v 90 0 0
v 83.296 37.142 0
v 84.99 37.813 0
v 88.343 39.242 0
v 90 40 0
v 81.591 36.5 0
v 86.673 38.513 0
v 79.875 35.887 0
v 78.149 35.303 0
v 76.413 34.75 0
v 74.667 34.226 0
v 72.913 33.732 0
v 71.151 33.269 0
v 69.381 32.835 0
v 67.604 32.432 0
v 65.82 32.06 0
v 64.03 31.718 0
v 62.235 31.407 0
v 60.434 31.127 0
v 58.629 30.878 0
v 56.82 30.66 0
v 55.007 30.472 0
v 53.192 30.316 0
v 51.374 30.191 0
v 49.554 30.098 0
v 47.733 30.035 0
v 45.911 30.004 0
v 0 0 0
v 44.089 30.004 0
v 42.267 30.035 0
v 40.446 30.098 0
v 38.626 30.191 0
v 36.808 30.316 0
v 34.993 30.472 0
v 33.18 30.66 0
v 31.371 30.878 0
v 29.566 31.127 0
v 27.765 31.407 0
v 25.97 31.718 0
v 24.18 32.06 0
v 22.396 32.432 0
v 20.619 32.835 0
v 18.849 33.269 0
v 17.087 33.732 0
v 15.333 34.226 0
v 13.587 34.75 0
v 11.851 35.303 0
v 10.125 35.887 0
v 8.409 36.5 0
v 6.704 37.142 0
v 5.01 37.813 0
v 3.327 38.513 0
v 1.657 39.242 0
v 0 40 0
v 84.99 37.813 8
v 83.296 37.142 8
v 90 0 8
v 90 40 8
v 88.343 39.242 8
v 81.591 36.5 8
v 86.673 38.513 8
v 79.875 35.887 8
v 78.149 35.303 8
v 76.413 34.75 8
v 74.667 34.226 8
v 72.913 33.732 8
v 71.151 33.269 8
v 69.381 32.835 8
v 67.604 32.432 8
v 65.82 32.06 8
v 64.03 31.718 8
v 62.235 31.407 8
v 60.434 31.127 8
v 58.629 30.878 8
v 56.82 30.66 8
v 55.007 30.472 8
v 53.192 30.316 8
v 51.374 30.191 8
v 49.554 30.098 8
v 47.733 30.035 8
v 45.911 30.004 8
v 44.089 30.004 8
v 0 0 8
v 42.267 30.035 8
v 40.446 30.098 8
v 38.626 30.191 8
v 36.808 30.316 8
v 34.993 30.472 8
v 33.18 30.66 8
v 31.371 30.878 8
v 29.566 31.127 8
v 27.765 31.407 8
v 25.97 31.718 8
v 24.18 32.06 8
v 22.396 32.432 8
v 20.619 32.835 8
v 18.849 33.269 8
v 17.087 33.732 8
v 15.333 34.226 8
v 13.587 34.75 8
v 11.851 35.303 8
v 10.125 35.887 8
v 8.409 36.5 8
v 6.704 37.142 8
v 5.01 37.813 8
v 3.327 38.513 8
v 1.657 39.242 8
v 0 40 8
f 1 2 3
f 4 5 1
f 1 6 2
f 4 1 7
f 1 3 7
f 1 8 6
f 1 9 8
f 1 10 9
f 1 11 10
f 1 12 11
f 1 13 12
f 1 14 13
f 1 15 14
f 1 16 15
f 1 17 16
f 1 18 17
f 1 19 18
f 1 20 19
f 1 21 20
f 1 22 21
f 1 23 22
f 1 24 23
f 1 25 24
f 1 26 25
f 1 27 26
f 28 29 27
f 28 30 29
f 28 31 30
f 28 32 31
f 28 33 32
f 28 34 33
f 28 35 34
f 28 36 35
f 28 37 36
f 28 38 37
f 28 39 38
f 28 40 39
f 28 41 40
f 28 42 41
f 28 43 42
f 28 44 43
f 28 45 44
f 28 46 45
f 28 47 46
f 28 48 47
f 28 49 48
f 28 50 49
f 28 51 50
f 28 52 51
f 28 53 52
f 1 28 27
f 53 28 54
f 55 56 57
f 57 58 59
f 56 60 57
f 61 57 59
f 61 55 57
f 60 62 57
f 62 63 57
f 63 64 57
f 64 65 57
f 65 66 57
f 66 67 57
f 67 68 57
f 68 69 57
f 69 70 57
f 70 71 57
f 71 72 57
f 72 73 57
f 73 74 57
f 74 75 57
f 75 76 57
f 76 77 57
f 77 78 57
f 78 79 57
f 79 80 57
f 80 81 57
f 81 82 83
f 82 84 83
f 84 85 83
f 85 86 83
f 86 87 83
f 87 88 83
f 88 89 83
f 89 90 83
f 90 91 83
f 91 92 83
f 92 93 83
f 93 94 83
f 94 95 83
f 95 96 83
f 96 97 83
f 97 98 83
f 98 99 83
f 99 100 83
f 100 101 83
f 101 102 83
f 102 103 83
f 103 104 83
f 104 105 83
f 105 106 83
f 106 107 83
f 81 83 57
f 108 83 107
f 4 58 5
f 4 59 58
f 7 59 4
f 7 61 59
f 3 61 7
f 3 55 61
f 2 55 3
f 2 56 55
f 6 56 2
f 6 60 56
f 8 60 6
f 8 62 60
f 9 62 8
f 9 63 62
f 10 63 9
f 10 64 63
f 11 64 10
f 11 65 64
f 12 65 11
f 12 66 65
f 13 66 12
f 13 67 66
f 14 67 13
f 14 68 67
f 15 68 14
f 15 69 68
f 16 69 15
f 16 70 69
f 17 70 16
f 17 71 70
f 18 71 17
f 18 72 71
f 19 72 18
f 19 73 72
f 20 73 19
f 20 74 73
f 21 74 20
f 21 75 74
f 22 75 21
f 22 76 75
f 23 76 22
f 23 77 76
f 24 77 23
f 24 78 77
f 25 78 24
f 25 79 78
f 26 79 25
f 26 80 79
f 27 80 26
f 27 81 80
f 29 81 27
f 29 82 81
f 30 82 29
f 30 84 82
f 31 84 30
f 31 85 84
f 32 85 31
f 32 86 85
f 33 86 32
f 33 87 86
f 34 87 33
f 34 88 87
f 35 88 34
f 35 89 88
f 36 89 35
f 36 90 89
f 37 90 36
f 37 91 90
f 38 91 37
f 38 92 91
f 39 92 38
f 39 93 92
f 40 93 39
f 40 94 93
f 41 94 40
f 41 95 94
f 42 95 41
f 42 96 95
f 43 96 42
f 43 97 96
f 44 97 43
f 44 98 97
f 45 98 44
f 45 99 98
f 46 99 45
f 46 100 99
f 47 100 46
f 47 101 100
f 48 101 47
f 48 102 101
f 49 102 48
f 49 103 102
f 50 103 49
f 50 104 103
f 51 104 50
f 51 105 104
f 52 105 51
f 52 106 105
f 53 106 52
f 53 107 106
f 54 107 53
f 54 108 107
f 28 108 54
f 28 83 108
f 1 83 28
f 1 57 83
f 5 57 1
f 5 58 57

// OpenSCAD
$fn = 32;

// ----------------------------------------------------------------------
// Arc profile plate: notch, 54 points
// ----------------------------------------------------------------------

// --- parameters (mm) ---
bar_l = 90;               // bar length, X
bar_w = 40;               // bar width, Y
notch_depth = 10;         // depth of the arc notch at mid-span
arc_r = 106.25;           // radius of the notch arc
arc_angle = 50.12;        // notch arc angle, degrees
arc_step = 1;             // sampling step of the notch arc, degrees
plate_t = 8;              // plate thickness, Z
fit_tol = 0.02;           // declared fit tolerance (prompt contract)
free_tol = 0.2;           // declared free tolerance (prompt contract)

profile = [[0, 0], [90, 0], [90, 40], [88.343, 39.242], [86.673, 38.513], [84.99, 37.813], [83.296, 37.142], [81.591, 36.5], [79.875, 35.887], [78.149, 35.303], [76.413, 34.75], [74.667, 34.226], [72.913, 33.732], [71.151, 33.269], [69.381, 32.835], [67.604, 32.432], [65.82, 32.06], [64.03, 31.718], [62.235, 31.407], [60.434, 31.127], [58.629, 30.878], [56.82, 30.66], [55.007, 30.472], [53.192, 30.316], [51.374, 30.191], [49.554, 30.098], [47.733, 30.035], [45.911, 30.004], [44.089, 30.004], [42.267, 30.035], [40.446, 30.098], [38.626, 30.191], [36.808, 30.316], [34.993, 30.472], [33.18, 30.66], [31.371, 30.878], [29.566, 31.127], [27.765, 31.407], [25.97, 31.718], [24.18, 32.06], [22.396, 32.432], [20.619, 32.835], [18.849, 33.269], [17.087, 33.732], [15.333, 34.226], [13.587, 34.75], [11.851, 35.303], [10.125, 35.887], [8.409, 36.5], [6.704, 37.142], [5.01, 37.813], [3.327, 38.513], [1.657, 39.242], [0, 40]];  // primary outline, 54 points, counter clockwise

// --- the one profile operation ---
linear_extrude(height = plate_t) polygon(points = profile);
